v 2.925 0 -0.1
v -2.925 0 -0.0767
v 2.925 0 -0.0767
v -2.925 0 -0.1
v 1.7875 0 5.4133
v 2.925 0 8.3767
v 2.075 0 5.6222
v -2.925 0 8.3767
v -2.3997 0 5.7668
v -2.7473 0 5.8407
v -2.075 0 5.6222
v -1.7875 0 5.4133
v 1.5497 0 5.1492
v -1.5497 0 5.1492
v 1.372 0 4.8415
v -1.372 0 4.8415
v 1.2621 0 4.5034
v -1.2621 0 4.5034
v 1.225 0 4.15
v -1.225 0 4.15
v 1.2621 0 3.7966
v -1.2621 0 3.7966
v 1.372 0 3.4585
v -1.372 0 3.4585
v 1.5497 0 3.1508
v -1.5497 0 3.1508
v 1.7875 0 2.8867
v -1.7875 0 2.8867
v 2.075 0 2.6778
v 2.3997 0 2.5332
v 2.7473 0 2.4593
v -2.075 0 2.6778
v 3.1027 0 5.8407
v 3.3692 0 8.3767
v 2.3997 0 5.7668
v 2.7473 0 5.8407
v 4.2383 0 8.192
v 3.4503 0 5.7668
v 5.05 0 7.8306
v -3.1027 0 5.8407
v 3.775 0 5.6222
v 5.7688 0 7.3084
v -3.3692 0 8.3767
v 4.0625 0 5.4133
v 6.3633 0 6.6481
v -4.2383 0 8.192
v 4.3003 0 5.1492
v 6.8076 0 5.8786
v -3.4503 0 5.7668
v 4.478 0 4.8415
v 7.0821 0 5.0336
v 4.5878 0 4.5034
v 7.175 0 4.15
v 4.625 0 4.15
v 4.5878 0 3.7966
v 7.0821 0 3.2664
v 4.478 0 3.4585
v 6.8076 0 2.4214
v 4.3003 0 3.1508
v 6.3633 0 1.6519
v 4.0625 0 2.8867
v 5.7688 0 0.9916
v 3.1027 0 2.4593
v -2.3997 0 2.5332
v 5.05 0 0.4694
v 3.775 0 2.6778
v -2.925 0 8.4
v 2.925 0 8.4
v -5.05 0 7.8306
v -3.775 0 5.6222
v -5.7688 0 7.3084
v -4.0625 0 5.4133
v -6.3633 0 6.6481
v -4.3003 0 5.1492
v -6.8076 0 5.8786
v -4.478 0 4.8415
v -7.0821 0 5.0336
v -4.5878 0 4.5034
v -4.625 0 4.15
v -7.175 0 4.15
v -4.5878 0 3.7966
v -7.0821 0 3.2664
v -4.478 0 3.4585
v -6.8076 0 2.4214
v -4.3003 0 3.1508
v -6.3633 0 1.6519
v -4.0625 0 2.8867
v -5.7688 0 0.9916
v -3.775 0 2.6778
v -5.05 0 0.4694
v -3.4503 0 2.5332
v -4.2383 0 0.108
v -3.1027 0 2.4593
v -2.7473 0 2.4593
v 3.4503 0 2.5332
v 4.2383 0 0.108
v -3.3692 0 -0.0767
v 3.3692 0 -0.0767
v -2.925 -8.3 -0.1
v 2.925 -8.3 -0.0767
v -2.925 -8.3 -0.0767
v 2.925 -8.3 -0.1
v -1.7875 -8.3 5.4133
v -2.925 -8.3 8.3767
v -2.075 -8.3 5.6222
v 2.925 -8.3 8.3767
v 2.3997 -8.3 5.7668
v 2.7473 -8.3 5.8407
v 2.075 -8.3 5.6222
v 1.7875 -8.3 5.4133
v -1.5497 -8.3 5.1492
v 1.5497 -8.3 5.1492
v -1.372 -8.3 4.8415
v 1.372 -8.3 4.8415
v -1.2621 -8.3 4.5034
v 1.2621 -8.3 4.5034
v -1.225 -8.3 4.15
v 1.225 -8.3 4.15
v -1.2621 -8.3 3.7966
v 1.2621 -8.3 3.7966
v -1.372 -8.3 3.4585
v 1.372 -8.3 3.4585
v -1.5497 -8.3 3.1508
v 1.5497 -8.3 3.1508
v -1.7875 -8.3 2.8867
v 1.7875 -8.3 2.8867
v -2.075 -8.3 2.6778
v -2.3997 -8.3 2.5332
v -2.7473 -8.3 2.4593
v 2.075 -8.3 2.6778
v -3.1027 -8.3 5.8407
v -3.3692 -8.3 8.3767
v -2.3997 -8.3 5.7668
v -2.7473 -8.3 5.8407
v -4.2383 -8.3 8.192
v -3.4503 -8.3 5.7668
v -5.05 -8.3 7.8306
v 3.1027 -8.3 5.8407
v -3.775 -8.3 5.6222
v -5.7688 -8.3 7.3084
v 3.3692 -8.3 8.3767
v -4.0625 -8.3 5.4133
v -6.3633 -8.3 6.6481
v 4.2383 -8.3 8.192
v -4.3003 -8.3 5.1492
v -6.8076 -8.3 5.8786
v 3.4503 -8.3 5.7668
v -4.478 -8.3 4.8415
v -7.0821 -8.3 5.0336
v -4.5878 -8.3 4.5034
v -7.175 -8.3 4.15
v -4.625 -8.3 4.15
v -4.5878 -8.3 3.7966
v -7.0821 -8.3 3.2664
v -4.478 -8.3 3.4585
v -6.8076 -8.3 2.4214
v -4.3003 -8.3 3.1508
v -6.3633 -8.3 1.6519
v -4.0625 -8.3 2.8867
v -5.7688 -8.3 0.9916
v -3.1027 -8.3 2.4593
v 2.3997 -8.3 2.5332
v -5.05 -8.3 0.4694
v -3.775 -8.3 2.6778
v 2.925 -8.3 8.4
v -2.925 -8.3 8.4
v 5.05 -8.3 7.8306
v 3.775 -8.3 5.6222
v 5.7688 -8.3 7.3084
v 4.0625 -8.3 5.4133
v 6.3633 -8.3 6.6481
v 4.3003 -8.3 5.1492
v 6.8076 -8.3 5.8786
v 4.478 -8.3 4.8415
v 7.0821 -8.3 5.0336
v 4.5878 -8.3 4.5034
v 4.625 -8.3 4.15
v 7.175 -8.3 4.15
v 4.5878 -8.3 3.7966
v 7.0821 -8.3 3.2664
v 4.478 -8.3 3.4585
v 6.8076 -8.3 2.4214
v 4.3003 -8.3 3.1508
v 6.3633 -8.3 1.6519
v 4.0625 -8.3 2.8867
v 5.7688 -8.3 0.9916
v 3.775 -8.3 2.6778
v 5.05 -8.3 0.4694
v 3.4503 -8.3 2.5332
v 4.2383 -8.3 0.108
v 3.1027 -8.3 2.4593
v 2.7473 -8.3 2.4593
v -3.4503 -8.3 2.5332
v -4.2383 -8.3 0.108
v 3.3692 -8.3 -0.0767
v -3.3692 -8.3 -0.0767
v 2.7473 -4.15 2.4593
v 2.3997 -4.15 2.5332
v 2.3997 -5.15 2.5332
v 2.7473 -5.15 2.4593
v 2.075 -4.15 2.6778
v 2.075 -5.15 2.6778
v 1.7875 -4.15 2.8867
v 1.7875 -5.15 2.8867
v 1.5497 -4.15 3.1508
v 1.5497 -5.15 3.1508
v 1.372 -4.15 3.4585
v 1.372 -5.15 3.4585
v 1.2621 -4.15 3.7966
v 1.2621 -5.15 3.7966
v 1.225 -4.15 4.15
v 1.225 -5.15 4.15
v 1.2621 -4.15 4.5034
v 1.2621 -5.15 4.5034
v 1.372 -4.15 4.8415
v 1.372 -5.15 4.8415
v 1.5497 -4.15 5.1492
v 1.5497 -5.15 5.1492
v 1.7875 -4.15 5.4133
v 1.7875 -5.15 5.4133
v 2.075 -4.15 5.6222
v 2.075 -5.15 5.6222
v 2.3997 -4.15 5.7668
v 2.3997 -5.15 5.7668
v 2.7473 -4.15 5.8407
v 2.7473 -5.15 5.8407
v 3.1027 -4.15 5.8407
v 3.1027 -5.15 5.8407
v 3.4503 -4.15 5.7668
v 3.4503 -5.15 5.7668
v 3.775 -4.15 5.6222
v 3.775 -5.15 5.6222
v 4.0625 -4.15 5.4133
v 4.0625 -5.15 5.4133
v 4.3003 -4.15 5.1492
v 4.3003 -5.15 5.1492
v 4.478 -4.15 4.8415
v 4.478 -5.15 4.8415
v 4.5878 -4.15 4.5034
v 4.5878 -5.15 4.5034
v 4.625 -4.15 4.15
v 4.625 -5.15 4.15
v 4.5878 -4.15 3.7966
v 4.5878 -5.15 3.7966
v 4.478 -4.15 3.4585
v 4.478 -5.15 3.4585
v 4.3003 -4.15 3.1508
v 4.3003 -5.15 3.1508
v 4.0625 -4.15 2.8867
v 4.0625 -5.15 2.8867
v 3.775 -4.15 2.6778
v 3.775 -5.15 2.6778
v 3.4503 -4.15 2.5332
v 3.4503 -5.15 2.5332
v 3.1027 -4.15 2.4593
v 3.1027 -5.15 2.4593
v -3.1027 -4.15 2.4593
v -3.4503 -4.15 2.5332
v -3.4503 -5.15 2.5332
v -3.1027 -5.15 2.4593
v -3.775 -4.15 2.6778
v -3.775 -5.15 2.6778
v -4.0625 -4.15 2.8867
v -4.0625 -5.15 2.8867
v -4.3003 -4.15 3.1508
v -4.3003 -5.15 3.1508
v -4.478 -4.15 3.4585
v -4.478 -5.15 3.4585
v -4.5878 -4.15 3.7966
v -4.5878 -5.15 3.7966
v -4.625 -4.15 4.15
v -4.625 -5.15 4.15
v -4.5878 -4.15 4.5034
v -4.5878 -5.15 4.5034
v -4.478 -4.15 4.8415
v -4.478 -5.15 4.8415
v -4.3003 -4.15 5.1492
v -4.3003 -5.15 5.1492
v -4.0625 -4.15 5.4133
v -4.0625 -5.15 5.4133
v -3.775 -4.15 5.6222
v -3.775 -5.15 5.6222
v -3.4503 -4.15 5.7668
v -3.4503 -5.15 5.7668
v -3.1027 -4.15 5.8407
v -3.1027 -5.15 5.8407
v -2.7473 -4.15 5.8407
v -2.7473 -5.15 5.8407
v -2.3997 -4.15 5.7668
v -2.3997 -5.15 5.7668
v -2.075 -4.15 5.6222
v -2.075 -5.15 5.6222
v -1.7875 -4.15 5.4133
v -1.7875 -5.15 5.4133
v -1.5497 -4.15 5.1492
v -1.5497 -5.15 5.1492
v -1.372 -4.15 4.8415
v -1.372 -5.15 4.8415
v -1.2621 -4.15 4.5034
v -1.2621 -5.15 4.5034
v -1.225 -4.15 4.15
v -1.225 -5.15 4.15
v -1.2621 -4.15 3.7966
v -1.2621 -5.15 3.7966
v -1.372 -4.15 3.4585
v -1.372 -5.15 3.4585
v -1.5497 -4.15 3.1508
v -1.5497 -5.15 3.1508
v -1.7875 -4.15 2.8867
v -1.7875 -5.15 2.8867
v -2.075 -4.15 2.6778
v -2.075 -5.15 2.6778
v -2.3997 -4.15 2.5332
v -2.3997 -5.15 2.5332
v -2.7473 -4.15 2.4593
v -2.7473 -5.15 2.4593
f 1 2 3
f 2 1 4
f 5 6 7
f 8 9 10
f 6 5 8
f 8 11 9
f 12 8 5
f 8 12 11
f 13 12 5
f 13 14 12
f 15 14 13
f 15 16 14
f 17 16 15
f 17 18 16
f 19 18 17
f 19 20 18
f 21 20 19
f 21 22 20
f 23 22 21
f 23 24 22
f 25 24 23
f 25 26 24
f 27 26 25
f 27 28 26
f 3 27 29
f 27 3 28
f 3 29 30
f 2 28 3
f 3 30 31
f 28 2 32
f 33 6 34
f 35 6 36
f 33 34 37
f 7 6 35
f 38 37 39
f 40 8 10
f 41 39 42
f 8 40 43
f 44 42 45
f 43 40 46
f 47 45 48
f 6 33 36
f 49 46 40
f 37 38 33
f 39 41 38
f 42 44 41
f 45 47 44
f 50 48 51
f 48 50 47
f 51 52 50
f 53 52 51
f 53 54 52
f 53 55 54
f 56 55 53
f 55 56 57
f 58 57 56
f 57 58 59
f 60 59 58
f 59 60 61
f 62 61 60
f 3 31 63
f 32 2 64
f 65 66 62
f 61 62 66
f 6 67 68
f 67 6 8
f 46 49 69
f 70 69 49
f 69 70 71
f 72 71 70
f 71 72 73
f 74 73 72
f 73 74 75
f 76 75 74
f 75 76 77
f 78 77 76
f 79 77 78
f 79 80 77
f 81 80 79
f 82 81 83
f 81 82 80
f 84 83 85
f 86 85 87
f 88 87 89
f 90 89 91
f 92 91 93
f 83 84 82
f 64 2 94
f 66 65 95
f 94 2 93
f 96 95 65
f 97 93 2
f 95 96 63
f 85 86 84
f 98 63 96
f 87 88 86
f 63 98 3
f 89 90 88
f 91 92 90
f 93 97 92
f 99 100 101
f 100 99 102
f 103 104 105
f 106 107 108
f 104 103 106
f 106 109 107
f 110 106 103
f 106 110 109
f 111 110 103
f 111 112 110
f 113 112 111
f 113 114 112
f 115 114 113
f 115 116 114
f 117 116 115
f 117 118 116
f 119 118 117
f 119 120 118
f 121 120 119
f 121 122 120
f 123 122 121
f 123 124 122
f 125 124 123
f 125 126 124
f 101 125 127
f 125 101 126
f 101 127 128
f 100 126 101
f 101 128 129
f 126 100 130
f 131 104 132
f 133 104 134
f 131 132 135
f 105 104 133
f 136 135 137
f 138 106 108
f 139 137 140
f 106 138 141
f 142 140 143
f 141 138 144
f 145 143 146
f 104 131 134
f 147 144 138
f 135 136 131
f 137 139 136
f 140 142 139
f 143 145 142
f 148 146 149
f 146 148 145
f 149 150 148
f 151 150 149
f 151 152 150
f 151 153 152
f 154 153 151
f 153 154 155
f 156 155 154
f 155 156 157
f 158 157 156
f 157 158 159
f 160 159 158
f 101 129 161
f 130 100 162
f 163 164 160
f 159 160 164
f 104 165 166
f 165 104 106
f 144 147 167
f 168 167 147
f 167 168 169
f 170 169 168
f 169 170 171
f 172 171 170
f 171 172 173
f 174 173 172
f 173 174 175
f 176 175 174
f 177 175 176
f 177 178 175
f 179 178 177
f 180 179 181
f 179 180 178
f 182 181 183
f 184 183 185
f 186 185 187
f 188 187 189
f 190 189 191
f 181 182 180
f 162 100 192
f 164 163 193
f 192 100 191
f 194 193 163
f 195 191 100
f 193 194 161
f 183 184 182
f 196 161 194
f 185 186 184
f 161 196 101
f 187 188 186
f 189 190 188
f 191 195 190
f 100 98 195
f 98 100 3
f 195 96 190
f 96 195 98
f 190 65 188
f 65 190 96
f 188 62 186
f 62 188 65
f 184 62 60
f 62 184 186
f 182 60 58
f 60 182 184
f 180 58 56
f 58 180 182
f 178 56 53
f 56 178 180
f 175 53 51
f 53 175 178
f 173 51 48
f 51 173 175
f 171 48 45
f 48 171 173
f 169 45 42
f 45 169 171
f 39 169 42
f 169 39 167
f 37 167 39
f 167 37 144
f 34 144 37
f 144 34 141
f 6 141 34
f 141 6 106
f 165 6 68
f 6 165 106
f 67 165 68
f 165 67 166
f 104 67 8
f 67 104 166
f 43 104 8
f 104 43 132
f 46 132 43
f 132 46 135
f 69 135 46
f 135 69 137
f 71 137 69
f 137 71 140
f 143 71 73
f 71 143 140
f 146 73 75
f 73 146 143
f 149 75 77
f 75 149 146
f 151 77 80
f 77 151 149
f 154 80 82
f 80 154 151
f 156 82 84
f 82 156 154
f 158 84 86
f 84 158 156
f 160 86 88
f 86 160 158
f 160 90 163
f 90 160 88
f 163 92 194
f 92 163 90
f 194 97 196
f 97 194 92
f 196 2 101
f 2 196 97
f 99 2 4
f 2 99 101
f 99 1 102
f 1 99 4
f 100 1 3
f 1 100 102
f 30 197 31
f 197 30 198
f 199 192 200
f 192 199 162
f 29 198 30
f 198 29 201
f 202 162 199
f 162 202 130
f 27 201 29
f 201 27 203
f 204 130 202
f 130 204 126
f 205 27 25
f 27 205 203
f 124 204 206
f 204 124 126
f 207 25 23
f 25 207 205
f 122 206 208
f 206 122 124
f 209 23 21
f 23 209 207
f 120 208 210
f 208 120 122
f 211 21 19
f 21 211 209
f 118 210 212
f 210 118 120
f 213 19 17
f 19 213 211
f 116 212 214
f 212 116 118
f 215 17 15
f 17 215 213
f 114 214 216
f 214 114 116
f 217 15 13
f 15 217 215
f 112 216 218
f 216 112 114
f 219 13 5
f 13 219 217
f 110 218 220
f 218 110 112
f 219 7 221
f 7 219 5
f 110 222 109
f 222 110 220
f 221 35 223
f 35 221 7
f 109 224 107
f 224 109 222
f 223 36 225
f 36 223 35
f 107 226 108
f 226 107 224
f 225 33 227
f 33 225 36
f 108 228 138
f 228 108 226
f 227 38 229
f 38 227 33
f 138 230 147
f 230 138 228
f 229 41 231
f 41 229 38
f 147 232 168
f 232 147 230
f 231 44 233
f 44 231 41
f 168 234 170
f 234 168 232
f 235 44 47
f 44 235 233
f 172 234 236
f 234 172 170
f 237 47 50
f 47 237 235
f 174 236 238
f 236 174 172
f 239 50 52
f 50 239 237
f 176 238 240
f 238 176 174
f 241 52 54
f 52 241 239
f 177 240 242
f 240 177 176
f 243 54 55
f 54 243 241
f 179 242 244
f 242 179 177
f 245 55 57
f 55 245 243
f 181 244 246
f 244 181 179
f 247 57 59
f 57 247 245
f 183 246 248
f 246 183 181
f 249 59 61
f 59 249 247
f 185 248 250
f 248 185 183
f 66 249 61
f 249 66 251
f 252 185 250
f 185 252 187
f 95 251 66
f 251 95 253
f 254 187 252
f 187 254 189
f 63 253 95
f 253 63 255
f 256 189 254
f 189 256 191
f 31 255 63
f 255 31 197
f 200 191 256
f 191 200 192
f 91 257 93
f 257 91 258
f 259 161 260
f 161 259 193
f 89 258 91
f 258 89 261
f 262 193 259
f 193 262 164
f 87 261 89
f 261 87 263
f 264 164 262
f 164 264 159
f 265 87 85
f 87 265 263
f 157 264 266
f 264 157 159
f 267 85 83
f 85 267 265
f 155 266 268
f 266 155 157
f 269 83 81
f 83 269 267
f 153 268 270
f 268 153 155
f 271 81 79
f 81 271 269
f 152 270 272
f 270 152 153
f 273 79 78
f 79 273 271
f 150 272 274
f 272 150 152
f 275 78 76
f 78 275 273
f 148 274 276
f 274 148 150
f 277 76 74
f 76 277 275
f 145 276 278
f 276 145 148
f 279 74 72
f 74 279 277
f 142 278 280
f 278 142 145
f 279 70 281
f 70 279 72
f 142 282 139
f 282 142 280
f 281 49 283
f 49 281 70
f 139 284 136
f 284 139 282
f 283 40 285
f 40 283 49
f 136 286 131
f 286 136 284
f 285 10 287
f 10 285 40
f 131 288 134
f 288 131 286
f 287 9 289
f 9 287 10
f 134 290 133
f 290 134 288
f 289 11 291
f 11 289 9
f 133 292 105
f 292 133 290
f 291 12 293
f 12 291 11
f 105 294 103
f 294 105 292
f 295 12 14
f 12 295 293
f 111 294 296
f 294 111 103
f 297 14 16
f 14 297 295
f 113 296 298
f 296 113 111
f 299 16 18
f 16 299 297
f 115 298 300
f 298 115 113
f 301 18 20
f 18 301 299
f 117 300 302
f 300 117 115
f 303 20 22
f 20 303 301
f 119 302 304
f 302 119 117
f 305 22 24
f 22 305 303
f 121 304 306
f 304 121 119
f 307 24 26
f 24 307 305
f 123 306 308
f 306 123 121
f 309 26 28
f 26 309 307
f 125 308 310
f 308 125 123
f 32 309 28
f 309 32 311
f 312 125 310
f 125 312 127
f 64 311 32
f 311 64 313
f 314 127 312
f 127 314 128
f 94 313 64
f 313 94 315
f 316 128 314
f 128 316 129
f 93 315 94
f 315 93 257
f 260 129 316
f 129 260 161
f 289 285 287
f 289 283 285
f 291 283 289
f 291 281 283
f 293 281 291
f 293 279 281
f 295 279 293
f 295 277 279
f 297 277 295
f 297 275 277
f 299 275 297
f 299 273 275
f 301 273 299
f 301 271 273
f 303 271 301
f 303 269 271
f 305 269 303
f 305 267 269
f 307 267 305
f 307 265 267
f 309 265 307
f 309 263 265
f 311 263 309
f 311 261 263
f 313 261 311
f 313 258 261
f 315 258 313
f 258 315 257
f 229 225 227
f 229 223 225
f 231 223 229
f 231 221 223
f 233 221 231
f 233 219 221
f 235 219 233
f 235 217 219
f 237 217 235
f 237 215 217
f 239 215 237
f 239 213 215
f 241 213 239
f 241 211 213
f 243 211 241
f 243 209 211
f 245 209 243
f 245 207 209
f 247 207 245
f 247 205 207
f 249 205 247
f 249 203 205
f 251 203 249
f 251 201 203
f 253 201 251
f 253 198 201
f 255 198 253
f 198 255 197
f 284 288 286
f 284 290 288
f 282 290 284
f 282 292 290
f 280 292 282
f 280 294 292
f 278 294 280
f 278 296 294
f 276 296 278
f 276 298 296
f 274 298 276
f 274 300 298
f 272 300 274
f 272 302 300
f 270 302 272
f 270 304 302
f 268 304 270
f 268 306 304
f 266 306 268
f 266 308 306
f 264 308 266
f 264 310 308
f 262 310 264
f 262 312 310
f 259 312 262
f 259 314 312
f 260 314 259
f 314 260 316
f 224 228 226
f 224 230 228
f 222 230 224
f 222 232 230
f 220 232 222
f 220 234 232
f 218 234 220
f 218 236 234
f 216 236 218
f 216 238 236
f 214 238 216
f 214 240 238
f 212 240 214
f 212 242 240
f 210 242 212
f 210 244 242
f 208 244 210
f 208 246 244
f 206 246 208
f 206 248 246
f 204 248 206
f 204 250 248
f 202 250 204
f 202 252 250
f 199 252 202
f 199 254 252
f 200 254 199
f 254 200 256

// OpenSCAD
// Values taken from datasheet
// https://www.mouser.fr/datasheet/2/400/double_aperture_cores-1291315.pdf

FERRITE_H = 8.3;
FERRITE_B = 14.5;
FERRITE_A = 8.5;
FERRITE_C = 5.85;
FERRITE_D = 3.4;


// Increase steps in render to have quality circles
$fs=0.01;

module BasicShape(){
    union(){
        translate([FERRITE_C/2, 0, 0])
            circle($fn = 0, $fa = 12, $fs = 0.01, r = FERRITE_A/2);
        translate([-FERRITE_C/2, 0, 0])
            circle($fn = 0, $fa = 12, $fs = 0.01, r = FERRITE_A/2);

        square([FERRITE_C, FERRITE_A], center=true);
    }
}

module InnerHoles(){

        translate([FERRITE_C/2, 0, 0])
            circle($fn = 0, $fa = 12, $fs = 0.01, r = FERRITE_D/2);

        translate([-FERRITE_C/2, 0, 0])
            circle($fn = 0, $fa = 12, $fs = 0.01, r = FERRITE_D/2);

        
}
module CompleteModel() {
translate([0, 0, FERRITE_H/2])
    rotate([90, 0, 0])
        union(){
            linear_extrude(height = FERRITE_H, convexity = 10, twist = 0)
                difference() {
                    BasicShape();
                    InnerHoles();
                }

            // workaround for error Stepup error "not fused ('union')",
            // also I have to note here that FreeCAD the seccond 
            // bigest abomination in IT (obviously after Yocto)
            translate([0, 0, FERRITE_H/2])
                linear_extrude(height = 1, convexity = 10, twist = 0)
                    BasicShape();
        }

}

CompleteModel();
